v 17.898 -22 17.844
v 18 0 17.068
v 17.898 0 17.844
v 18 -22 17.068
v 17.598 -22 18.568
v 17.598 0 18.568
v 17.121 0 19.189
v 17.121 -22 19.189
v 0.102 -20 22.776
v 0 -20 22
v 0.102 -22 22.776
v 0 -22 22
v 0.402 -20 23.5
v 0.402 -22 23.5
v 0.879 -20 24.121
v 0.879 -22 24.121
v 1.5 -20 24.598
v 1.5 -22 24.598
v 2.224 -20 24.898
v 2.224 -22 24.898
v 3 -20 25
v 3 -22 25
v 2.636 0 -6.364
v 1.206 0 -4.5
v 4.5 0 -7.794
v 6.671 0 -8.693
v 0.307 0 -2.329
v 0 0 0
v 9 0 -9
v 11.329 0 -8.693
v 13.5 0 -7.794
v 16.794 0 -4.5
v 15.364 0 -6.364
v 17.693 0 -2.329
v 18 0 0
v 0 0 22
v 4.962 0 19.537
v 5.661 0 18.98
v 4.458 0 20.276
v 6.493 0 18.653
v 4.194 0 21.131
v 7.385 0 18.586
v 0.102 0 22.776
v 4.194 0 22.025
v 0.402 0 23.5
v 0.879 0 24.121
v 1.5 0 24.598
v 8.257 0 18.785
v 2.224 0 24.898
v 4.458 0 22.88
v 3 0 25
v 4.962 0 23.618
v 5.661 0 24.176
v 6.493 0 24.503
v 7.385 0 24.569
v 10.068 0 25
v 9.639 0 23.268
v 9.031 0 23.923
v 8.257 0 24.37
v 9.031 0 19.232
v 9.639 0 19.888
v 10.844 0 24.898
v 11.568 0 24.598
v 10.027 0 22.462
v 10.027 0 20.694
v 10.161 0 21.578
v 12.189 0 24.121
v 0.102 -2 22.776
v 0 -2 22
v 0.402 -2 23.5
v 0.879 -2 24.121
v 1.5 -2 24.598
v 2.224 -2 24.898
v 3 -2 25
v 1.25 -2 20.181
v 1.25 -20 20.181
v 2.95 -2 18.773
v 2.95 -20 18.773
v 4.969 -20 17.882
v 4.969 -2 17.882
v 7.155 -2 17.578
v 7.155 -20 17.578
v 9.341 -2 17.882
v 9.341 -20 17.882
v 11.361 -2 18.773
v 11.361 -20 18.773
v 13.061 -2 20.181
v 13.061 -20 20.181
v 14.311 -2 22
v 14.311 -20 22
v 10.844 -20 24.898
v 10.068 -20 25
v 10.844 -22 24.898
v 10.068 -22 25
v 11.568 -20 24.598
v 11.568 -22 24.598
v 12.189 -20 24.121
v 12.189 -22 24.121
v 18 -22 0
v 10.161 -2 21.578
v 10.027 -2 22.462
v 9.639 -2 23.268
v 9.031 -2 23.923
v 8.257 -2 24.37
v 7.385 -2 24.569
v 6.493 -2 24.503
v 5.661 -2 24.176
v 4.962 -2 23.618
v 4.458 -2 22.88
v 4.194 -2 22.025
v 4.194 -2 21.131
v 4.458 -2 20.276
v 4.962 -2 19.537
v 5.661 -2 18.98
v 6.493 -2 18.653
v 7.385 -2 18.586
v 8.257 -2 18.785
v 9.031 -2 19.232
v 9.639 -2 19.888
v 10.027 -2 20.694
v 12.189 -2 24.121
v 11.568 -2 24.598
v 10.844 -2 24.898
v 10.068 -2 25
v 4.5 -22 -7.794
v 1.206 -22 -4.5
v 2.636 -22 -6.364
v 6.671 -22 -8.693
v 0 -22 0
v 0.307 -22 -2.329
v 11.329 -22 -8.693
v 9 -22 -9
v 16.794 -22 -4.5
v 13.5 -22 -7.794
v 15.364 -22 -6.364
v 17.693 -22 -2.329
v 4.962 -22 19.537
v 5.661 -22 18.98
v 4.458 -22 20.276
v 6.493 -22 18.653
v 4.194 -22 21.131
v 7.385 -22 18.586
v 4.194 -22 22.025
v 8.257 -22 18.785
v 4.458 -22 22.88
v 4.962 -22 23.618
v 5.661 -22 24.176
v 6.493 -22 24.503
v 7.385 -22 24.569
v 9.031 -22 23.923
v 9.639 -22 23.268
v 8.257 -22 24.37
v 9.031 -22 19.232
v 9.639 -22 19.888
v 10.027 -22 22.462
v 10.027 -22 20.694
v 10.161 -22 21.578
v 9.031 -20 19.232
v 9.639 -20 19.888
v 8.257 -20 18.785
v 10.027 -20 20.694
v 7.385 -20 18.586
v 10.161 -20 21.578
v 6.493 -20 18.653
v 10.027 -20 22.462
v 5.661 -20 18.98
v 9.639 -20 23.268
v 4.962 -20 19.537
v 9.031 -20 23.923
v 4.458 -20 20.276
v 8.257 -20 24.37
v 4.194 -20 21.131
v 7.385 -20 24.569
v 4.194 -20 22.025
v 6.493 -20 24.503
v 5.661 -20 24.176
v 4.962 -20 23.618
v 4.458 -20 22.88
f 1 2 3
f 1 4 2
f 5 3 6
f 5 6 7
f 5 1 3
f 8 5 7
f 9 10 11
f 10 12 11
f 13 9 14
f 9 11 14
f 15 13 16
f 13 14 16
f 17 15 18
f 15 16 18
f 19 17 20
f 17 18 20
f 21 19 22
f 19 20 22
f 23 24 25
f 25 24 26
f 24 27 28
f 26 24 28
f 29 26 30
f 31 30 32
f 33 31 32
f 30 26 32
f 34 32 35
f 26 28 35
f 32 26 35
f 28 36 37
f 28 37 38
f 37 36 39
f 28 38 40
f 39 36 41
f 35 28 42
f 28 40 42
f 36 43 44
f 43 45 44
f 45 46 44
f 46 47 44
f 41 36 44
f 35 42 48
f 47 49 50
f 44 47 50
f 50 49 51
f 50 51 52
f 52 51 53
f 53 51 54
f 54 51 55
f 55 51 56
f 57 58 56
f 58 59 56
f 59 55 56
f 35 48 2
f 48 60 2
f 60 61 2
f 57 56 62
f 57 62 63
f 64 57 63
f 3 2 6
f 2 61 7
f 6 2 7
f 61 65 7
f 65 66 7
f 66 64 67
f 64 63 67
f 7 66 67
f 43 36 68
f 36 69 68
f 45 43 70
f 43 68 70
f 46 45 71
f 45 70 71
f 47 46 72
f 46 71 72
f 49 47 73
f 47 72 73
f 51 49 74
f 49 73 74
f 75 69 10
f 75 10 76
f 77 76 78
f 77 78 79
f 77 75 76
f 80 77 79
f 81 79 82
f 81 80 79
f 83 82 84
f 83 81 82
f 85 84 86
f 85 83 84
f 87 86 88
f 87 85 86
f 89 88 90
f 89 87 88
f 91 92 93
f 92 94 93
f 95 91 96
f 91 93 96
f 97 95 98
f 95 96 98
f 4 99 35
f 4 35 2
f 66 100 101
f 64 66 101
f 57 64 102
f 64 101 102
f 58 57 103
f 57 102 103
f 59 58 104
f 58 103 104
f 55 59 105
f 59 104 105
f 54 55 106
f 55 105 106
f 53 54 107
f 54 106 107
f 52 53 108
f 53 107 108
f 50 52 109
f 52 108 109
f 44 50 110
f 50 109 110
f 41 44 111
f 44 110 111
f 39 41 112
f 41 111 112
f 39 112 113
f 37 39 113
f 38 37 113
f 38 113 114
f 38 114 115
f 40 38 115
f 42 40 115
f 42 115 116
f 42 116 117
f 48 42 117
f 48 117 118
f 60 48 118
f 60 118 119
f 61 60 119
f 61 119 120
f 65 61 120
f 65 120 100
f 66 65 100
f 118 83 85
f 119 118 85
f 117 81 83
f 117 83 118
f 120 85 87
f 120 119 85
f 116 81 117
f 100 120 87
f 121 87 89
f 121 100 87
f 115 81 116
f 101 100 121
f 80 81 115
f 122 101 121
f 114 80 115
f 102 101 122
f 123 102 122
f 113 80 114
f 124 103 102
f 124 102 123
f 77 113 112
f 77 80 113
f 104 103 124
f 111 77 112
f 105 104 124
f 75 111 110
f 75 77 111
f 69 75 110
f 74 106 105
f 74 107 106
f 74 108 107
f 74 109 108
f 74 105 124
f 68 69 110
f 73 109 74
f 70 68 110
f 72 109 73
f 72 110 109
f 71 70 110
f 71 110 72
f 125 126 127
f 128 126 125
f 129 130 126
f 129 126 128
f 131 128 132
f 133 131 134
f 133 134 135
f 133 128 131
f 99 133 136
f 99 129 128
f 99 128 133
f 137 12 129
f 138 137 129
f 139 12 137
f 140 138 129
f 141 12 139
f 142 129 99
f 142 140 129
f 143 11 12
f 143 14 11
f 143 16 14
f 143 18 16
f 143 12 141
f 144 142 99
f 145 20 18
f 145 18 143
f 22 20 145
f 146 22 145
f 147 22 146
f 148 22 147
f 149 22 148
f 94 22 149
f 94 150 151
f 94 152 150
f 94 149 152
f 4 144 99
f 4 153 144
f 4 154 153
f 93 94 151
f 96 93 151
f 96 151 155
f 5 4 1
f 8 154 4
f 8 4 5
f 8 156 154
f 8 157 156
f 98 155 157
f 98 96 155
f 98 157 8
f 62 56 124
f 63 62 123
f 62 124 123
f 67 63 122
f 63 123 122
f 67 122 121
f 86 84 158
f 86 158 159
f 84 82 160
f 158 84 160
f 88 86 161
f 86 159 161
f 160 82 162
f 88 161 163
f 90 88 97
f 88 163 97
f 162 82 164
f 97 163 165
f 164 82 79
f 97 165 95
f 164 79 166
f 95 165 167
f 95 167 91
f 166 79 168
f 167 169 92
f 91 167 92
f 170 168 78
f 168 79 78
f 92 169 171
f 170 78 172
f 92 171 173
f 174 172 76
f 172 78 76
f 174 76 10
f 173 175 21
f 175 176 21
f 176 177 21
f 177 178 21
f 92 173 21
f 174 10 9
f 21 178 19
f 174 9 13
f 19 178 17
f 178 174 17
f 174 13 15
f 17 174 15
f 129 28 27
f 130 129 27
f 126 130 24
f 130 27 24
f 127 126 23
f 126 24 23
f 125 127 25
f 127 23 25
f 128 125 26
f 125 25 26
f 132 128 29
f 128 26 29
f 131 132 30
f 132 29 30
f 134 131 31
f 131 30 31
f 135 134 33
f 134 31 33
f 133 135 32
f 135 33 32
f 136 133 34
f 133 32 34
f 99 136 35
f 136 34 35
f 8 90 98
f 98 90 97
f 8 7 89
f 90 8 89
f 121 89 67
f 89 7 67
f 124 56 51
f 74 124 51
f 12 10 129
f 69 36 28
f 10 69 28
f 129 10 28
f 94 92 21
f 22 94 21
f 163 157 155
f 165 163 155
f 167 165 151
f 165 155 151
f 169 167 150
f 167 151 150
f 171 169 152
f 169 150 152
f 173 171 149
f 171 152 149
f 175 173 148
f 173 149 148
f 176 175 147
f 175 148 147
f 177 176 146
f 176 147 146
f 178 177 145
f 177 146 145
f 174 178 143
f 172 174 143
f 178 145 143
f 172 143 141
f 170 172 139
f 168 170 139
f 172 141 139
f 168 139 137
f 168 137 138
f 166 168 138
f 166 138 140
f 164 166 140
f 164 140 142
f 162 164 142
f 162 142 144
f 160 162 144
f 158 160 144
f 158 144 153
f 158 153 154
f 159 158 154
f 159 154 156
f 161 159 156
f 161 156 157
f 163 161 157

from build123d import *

# Parameters (mm, degrees)
F1_DEPTH = 22
F2_W     = 18
F2_H     = 3
F3_DEPTH = 25
F6_DEPTH = 18
F7_R     = 3
F8_R     = 3
F9_DEPTH = 25


with BuildPart() as f1:
    # F0 (on Front) → F1 (new body)
    with BuildSketch(Plane.XZ):
        with BuildLine():
            ThreePointArc((0, 0), (9, -9), (18, 0))
            Line((18, 0), (18, 18.310677))
            Line((18, 18.310677), (11.310677, 25))
            Line((11.310677, 25), (0, 25))
            Line((0, 25), (0, 0))
        make_face()
    extrude(amount=F1_DEPTH)

    # F2 (on face) → F3 (cut)
    with BuildSketch(Plane(origin=(0, 0, 0), x_dir=(0, -1, 0), z_dir=(-1, 0, 0))):
        with Locations((11, 23.5)):
            Rectangle(F2_W, F2_H)
    extrude(amount=-F3_DEPTH, mode=Mode.SUBTRACT)

    # F5 (on offset) → F6 (cut)
    with BuildSketch(Plane.XZ.offset(2)):
        with BuildLine():
            Line((14.310677, 22), (0, 22))
            ThreePointArc((0, 22), (7.155339, 17.577867), (14.310677, 22))
        make_face()
    extrude(amount=F6_DEPTH, mode=Mode.SUBTRACT)

    # F7
    f7_edges = [f1.edges().sort_by_distance(p)[0] for p in [
        (18, -11, 18.310677),
        (11.310677, -21, 25),
        (11.310677, -1, 25),
        (0, -21, 25),
        (0, -1, 25),
    ]]
    fillet(f7_edges, radius=F7_R)

    # F8 (on face) → F9 (cut)
    with BuildSketch(Plane.XZ.offset(22)):
        with Locations((7.160677, 21.577867)):
            Circle(F8_R)
    extrude(amount=-F9_DEPTH, mode=Mode.SUBTRACT)


solid = f1.part
